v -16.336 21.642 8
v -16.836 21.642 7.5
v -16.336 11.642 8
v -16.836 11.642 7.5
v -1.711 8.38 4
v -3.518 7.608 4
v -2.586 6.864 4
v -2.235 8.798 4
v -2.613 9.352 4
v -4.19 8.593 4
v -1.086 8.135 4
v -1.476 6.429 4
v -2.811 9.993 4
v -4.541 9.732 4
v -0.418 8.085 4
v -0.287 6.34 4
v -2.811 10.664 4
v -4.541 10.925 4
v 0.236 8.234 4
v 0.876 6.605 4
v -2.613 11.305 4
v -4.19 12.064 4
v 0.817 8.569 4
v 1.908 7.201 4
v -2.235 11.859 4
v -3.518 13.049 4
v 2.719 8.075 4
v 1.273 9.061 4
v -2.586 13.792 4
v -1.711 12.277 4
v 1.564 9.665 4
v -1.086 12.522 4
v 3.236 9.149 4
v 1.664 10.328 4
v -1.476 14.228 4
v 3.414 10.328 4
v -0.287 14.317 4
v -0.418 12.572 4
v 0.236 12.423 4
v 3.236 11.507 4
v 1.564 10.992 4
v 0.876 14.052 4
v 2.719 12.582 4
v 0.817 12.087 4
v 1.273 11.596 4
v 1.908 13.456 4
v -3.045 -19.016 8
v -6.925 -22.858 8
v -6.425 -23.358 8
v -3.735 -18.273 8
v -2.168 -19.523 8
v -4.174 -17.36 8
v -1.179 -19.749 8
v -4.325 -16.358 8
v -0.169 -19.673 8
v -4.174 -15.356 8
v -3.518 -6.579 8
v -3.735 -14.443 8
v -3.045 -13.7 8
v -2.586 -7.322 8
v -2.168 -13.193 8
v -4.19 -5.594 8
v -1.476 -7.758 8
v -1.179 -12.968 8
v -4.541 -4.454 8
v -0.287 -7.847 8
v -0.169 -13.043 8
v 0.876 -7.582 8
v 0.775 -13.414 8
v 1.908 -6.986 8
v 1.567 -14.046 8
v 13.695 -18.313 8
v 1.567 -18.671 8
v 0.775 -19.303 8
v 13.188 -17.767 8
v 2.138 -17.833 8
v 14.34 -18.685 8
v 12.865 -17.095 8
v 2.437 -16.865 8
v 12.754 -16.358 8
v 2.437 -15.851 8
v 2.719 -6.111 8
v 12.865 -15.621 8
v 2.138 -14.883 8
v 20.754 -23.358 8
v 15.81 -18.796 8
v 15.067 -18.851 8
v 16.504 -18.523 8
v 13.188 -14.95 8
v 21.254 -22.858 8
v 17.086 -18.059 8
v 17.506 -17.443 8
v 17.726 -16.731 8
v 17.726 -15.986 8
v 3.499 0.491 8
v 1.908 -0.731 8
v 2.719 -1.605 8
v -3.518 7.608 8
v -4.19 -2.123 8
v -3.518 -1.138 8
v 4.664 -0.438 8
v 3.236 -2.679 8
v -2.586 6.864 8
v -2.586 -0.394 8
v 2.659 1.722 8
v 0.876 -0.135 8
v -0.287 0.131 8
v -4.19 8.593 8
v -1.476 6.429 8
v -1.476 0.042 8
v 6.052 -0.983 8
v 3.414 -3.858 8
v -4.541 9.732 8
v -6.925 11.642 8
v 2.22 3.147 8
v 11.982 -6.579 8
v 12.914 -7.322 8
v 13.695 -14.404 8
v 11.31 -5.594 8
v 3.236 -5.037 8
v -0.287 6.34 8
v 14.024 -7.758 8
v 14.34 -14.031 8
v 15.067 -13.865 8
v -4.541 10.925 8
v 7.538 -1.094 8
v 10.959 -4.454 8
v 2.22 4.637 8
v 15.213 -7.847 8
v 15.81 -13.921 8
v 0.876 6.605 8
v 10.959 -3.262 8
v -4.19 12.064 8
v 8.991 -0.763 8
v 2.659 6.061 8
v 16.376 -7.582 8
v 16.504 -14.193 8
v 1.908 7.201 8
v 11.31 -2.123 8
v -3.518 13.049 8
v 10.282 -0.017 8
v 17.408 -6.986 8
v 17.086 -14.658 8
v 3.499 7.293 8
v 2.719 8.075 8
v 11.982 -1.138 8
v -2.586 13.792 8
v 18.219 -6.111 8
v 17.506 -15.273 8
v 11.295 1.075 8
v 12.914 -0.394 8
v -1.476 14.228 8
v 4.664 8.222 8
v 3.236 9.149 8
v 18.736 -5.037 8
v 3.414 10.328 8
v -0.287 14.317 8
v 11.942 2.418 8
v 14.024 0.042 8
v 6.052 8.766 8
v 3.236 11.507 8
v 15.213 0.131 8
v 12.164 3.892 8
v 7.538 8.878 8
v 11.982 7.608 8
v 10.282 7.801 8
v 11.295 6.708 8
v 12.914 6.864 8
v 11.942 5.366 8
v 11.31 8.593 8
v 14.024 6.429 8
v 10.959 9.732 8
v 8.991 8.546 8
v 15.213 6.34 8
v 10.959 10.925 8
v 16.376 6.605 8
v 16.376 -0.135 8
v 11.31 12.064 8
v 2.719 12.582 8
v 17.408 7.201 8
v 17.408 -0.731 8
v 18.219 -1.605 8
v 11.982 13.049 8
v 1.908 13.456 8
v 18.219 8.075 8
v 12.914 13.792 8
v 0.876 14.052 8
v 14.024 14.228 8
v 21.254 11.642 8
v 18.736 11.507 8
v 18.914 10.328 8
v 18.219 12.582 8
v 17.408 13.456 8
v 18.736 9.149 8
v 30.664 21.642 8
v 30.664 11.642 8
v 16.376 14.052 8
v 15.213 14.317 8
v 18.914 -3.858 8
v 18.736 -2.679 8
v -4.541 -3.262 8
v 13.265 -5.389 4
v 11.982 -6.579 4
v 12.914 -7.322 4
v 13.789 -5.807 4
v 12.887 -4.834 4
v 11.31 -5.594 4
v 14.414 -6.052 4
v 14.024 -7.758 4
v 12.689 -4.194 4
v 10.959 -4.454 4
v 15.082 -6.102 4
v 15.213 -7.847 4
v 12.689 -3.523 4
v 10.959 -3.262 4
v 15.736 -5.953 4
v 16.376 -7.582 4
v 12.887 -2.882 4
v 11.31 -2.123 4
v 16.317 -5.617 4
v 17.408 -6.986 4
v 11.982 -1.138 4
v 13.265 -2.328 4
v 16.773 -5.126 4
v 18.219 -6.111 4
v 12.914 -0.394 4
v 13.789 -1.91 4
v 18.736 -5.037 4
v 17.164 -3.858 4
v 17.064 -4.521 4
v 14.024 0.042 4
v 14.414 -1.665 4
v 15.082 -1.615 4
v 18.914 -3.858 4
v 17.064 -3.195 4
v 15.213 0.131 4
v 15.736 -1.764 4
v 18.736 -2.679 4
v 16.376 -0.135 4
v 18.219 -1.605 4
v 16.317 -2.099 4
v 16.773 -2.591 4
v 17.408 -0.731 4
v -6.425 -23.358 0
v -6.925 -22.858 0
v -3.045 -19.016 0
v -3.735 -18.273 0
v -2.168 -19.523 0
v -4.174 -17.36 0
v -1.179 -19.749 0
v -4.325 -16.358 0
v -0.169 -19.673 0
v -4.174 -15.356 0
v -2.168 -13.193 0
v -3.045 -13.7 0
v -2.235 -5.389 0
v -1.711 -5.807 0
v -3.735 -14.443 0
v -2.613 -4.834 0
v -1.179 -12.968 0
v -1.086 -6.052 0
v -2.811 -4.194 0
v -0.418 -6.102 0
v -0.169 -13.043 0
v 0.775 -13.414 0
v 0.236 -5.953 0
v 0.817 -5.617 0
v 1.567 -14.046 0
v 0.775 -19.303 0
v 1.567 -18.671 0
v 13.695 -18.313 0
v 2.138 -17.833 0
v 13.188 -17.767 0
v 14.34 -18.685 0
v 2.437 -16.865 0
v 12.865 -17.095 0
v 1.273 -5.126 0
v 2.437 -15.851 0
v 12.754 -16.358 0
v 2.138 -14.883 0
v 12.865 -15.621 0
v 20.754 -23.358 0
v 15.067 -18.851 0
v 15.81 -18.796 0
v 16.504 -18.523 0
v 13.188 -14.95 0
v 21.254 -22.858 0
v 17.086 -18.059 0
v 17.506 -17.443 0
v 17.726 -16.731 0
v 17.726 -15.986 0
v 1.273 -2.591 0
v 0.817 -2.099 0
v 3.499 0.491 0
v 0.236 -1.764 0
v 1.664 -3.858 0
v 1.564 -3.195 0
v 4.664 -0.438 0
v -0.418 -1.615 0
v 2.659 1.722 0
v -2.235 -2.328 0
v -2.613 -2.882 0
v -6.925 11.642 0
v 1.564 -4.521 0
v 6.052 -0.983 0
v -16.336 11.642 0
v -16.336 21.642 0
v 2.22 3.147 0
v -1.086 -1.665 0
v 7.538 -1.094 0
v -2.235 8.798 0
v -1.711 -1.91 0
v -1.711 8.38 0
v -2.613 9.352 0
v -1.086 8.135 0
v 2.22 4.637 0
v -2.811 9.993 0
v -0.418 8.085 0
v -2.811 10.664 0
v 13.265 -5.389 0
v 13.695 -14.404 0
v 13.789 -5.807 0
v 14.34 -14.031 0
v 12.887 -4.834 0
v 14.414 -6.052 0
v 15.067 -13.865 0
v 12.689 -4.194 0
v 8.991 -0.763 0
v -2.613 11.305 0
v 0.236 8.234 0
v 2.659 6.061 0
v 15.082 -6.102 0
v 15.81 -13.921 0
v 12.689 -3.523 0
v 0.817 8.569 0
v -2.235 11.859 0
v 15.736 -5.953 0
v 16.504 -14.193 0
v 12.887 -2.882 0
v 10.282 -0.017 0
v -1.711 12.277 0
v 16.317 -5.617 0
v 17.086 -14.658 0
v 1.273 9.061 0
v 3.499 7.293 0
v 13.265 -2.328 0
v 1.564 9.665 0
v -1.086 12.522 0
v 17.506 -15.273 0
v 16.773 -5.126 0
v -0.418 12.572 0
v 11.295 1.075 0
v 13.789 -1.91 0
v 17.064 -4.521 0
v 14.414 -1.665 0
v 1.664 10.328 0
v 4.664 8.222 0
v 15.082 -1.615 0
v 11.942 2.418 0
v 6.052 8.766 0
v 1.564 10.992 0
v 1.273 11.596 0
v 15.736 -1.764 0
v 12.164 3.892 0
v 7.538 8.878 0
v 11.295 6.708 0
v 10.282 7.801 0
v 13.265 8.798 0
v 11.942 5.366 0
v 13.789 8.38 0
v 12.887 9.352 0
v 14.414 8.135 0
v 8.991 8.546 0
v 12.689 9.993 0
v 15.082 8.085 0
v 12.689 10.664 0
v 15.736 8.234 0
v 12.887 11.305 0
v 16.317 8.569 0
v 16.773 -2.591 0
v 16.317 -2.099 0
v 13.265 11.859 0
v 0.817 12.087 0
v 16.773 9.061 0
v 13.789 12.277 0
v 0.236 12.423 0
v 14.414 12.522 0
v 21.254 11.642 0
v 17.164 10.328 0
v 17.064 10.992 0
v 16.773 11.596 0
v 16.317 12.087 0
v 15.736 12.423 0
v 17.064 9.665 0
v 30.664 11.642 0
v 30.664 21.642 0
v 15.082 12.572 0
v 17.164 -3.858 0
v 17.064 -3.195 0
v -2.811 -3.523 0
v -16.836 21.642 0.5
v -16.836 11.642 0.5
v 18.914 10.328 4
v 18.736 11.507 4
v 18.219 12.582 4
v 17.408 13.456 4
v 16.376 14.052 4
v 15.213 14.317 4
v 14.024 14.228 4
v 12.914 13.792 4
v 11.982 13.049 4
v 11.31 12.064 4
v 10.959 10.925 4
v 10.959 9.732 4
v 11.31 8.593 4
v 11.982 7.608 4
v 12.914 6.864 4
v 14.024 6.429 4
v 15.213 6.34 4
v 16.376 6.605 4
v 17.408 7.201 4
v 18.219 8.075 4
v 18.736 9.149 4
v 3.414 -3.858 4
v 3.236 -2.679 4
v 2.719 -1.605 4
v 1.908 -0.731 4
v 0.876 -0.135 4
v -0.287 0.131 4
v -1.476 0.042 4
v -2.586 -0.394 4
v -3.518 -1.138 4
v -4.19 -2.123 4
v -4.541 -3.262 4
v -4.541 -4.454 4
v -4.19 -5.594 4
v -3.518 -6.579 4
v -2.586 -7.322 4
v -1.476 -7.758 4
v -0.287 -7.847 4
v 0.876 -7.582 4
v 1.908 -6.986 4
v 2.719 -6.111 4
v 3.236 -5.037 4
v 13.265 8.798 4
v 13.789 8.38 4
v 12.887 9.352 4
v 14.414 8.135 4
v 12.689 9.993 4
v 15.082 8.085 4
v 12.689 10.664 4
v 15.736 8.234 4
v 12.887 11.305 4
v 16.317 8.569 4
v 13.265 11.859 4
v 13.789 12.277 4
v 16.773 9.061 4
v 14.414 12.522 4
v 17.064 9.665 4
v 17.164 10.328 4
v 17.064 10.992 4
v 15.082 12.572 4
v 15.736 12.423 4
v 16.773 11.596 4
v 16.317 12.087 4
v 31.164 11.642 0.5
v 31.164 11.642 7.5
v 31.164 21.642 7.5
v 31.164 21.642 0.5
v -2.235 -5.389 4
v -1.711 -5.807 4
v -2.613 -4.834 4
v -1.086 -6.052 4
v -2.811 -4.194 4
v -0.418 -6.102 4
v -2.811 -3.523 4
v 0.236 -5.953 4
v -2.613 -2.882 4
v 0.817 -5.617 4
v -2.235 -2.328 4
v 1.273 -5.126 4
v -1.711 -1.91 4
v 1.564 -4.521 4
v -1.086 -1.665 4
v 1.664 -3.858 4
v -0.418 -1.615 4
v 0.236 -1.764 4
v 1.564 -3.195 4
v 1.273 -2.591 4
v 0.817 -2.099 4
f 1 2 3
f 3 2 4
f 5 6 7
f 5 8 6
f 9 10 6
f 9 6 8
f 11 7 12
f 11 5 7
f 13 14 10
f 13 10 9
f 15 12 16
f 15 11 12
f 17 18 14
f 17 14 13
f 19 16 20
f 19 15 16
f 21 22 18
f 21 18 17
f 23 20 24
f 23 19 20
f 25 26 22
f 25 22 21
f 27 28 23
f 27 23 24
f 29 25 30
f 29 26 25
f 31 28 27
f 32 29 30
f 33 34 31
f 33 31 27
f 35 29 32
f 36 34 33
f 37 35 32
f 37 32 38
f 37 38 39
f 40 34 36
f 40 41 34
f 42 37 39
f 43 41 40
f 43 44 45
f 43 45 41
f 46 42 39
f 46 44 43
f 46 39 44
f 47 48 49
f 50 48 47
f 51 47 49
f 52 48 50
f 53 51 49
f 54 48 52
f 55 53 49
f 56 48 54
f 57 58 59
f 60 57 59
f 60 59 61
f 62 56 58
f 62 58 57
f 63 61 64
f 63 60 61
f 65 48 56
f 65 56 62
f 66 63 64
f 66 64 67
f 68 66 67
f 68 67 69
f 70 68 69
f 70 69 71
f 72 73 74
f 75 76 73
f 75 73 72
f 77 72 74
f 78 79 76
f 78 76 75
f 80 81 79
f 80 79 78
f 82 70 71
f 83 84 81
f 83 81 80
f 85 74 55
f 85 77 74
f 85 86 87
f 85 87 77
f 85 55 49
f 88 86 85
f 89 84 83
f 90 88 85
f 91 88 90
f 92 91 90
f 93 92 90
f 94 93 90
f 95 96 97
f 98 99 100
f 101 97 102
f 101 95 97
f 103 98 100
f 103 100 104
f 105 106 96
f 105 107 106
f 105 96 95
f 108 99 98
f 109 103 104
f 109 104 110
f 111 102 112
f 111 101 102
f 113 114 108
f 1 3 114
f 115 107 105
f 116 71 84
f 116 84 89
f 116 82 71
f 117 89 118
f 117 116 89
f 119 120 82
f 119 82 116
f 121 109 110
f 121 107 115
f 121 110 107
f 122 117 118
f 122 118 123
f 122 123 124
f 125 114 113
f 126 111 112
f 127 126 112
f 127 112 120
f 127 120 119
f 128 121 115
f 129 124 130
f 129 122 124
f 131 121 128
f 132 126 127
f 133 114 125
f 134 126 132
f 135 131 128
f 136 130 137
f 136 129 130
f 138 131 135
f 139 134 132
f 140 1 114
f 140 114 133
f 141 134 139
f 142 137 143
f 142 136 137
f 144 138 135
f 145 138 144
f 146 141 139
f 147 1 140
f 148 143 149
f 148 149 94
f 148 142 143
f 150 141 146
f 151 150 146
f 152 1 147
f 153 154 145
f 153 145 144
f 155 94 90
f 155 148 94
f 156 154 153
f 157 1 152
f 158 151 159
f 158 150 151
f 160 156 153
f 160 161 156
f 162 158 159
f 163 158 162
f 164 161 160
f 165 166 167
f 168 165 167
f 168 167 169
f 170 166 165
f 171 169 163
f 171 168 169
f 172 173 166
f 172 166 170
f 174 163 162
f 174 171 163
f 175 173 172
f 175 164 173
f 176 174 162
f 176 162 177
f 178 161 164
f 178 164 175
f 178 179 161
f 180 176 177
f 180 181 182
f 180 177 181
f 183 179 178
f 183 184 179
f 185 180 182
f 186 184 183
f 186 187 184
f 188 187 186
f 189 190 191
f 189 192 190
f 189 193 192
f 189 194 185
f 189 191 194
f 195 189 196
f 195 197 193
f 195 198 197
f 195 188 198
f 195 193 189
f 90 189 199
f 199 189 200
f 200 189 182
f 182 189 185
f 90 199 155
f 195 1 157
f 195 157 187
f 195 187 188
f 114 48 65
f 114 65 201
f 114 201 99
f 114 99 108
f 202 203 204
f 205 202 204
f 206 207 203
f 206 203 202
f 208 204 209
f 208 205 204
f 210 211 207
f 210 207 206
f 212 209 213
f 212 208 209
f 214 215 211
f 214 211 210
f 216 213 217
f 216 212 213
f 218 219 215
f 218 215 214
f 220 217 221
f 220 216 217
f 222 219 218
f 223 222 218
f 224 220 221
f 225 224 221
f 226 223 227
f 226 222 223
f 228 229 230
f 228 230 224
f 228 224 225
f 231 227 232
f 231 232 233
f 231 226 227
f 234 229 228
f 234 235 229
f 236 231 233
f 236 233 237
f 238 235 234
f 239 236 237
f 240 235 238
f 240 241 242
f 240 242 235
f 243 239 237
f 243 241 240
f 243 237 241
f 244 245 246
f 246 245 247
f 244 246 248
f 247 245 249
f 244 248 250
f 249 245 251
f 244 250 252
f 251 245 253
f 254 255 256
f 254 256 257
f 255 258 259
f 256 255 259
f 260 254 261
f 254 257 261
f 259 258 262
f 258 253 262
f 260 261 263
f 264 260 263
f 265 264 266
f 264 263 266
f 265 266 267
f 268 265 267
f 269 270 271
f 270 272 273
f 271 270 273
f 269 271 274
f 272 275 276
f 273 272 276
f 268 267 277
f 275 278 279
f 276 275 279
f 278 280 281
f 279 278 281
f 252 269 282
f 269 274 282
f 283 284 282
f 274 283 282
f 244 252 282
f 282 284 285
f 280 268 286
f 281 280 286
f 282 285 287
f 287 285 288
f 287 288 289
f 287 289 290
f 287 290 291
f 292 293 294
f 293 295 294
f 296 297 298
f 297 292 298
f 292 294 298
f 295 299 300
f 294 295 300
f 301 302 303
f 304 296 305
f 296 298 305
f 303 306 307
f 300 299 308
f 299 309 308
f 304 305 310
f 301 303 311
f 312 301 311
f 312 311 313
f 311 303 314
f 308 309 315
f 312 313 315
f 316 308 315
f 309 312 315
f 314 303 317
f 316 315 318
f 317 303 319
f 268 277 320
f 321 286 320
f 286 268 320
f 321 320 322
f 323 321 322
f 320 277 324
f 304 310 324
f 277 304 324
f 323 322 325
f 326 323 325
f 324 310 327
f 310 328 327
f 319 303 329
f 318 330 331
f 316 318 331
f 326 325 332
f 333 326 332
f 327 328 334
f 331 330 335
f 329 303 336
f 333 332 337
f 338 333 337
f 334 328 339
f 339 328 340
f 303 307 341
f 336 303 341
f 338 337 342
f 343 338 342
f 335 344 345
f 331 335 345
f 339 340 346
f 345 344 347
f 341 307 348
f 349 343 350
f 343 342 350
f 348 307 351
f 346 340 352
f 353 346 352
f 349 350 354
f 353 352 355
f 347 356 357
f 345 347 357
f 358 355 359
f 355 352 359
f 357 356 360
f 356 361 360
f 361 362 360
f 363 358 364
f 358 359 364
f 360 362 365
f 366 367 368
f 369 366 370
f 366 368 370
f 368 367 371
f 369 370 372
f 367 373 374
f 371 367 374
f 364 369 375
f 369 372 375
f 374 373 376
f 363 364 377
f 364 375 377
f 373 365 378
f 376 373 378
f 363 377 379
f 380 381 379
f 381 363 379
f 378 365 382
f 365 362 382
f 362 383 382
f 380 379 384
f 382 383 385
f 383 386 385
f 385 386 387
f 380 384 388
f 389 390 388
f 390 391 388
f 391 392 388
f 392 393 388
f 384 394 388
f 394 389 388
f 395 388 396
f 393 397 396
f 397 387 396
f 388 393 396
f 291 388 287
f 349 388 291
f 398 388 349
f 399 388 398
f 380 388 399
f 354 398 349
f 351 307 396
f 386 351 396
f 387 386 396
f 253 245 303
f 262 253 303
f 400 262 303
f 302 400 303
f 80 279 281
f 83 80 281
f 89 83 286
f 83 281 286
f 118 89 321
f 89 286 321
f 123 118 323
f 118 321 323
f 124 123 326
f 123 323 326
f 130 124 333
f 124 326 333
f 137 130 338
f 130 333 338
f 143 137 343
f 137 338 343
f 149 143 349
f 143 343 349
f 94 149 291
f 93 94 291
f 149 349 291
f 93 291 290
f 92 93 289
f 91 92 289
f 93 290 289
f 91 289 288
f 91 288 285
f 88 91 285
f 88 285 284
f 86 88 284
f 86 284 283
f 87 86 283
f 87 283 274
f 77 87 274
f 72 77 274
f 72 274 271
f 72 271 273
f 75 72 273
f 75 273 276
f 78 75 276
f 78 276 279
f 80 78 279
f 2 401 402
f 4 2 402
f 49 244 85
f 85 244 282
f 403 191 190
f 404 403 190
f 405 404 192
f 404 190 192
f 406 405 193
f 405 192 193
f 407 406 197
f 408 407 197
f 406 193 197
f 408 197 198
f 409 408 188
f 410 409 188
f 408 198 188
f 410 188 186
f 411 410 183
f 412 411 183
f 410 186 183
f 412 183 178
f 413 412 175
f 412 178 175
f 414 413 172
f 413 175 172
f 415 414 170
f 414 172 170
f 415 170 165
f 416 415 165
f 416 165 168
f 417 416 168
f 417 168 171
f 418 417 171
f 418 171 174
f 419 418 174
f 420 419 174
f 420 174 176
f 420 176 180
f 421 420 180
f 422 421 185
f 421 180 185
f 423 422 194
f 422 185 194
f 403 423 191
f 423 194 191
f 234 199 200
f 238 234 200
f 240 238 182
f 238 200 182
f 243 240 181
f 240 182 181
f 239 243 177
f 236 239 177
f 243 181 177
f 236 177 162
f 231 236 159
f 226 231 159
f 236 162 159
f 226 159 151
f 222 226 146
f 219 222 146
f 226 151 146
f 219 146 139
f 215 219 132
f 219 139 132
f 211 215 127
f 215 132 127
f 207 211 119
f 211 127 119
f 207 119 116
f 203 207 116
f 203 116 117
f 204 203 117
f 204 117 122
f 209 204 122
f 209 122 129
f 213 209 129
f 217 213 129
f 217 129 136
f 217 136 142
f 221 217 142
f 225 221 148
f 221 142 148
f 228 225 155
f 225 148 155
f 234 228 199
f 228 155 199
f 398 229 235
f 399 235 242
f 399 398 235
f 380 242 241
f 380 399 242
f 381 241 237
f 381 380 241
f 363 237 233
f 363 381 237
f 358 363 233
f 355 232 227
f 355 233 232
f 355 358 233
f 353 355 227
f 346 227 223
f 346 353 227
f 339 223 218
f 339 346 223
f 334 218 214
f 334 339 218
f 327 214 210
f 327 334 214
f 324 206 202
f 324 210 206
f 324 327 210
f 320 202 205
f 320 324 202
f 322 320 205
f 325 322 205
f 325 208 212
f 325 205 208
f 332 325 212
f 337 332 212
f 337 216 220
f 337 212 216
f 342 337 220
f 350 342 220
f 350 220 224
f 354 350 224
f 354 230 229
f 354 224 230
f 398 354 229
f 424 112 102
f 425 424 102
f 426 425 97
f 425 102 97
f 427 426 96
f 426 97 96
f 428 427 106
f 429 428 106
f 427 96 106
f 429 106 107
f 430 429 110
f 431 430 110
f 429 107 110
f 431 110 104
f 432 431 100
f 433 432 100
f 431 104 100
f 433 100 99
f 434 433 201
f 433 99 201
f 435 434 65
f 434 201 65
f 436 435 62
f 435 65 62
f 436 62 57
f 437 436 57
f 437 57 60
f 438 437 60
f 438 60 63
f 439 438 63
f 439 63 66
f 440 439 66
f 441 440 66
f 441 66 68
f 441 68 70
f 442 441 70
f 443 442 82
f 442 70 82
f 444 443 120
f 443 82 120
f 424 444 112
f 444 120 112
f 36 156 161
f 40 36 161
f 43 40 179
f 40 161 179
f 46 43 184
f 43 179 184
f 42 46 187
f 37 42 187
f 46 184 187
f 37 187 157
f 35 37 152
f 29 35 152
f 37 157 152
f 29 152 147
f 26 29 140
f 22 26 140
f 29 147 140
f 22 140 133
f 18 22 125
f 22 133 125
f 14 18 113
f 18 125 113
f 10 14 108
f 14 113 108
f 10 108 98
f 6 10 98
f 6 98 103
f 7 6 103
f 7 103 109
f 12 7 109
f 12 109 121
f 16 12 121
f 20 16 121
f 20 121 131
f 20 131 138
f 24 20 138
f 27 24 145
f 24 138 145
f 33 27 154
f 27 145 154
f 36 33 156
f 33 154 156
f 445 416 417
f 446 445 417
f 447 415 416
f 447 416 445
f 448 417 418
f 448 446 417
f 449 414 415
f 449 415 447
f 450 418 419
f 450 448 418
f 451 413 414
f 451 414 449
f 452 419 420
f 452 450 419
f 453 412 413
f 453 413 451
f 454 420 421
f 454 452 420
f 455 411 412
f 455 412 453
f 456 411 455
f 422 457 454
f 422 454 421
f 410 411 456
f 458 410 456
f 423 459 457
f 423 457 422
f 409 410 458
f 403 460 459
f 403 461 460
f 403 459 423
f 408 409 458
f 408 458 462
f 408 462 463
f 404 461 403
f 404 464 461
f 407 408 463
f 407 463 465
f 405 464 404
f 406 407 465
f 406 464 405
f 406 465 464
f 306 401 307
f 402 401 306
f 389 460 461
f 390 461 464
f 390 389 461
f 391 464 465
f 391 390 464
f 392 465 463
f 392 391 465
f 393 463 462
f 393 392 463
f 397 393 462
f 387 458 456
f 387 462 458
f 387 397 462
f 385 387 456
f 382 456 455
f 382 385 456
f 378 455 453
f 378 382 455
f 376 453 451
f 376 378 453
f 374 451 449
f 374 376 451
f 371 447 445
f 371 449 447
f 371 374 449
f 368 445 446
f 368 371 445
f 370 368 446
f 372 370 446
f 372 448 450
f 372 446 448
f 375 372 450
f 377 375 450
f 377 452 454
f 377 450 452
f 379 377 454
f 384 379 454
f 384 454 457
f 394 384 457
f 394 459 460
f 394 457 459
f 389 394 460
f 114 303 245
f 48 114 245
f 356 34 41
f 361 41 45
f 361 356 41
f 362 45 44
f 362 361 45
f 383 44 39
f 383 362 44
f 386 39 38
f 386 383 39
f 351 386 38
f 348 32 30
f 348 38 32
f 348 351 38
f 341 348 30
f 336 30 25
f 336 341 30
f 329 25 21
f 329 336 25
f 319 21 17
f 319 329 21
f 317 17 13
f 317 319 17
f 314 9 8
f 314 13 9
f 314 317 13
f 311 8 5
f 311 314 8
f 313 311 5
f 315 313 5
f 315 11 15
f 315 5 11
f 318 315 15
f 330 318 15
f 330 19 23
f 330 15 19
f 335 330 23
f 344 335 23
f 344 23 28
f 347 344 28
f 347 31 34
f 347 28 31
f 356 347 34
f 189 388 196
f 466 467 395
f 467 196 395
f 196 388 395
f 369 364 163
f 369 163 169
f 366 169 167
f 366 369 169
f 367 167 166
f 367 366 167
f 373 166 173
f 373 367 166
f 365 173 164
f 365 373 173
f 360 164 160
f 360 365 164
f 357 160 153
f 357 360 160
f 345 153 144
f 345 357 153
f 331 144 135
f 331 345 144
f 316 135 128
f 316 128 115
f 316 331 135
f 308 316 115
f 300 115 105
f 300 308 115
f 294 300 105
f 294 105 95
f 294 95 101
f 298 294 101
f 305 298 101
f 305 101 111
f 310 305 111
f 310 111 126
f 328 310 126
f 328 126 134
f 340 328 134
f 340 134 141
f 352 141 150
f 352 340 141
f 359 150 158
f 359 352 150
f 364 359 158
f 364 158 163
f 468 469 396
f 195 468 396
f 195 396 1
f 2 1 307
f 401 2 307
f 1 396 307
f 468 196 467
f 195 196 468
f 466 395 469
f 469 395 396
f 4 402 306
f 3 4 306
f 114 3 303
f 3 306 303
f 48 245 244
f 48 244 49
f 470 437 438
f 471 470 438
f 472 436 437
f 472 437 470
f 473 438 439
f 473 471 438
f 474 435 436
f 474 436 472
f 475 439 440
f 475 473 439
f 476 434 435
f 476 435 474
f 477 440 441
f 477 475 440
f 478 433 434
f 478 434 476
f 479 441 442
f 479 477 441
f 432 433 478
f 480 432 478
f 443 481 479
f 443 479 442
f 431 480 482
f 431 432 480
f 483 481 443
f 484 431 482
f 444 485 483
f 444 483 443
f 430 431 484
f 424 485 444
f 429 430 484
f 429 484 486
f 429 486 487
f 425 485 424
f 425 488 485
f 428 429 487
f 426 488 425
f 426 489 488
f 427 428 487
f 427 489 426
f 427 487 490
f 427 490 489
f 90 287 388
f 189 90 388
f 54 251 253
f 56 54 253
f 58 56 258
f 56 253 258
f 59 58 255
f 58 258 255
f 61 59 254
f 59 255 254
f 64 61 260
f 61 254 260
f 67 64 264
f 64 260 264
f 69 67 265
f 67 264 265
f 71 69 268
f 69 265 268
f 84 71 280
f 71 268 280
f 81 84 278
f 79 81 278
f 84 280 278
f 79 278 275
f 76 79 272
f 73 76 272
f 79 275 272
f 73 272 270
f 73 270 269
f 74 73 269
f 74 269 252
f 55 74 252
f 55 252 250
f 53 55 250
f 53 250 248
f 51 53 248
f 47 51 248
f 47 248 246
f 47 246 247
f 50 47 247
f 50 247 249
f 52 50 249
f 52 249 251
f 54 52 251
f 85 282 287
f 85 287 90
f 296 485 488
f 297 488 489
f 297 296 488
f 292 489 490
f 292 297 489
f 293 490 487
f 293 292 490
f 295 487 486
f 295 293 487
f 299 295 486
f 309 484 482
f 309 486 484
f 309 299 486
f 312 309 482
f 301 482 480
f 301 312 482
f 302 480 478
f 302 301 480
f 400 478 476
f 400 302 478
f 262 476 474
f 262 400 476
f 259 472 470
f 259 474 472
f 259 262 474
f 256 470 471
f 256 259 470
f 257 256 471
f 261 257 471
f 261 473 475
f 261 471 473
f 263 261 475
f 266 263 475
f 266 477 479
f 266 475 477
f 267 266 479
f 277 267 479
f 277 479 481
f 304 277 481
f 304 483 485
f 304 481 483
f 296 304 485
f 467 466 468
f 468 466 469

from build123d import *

# Parameters (mm, degrees)
SKETCH1_R             = 5
SKETCH1_R_2           = 2.25
BOSS_EXTRUDE1_DEPTH   = 8
SKETCH2_R             = 4
CUT_EXTRUDE1_DEPTH    = 4
M6_TAPPED_HOLE1_D     = 5
M6_TAPPED_HOLE1_DEPTH = 15
M6_TAPPED_HOLE1_TIP   = 1.502151548
M8_TAPPED_HOLE1_D     = 6.8
M8_TAPPED_HOLE1_DEPTH = 19.75
M8_TAPPED_HOLE1_TIP   = 2.042926105
CHAMFER1_SIZE         = 0.5
CHAMFER2_SIZE         = 0.5


with BuildPart() as part:
    # Sketch1 → Boss-Extrude1 (new body)
    with BuildSketch(Plane.XY):
        Polygon((21.253731343, 11.641791045), (31.164179104, 11.641791045), (31.164179104, 21.641791045), (-16.835820896, 21.641791045), (-16.835820896, 11.641791045), (-6.925373134, 11.641791045), (-6.925373134, -23.358208955), (21.253731343, -23.358208955), align=None)
        with Locations((7.164179104, 3.891791045)):
            Circle(SKETCH1_R, mode=Mode.SUBTRACT)
        with Locations((-0.585820896, -3.858208955)):
            Circle(SKETCH1_R_2, mode=Mode.SUBTRACT)
        with Locations((14.914179104, -3.858208955)):
            Circle(SKETCH1_R_2, mode=Mode.SUBTRACT)
        with Locations((14.914179104, 10.328358209)):
            Circle(SKETCH1_R_2, mode=Mode.SUBTRACT)
        with Locations((-0.585820896, 10.328358209)):
            Circle(SKETCH1_R_2, mode=Mode.SUBTRACT)
    extrude(amount=BOSS_EXTRUDE1_DEPTH)

    # Sketch2 → Cut-Extrude1 (cut)
    with BuildSketch(Plane.XY.offset(8)):
        with Locations((-0.585820896, 10.328358209)):
            Circle(SKETCH2_R)
        with Locations((14.914179104, 10.328358209)):
            Circle(SKETCH2_R)
        with Locations((14.914179104, -3.858208955)):
            Circle(SKETCH2_R)
        with Locations((-0.585820896, -3.858208955)):
            Circle(SKETCH2_R)
    extrude(amount=-CUT_EXTRUDE1_DEPTH, mode=Mode.SUBTRACT)

    # M6 Tapped Hole1
    with Locations(Plane.XY.offset(8)):
        with Locations((15.253731343, -16.358208955)):
            Hole(M6_TAPPED_HOLE1_D / 2, depth=M6_TAPPED_HOLE1_DEPTH)
            with Locations((0, 0, -(M6_TAPPED_HOLE1_DEPTH + M6_TAPPED_HOLE1_TIP / 2))):  # 118° drill point
                Cone(0, M6_TAPPED_HOLE1_D / 2, M6_TAPPED_HOLE1_TIP, mode=Mode.SUBTRACT)

    # M8 Tapped Hole1
    with Locations(Plane.XY.offset(8)):
        with Locations((-0.925373134, -16.358208955)):
            Hole(M8_TAPPED_HOLE1_D / 2, depth=M8_TAPPED_HOLE1_DEPTH)
            with Locations((0, 0, -(M8_TAPPED_HOLE1_DEPTH + M8_TAPPED_HOLE1_TIP / 2))):  # 118° drill point
                Cone(0, M8_TAPPED_HOLE1_D / 2, M8_TAPPED_HOLE1_TIP, mode=Mode.SUBTRACT)

    # Chamfer1
    chamfer1_edges = [part.edges().sort_by_distance(p)[0] for p in [
        (-16.835820896, 16.641791045, 0),
        (31.164179104, 16.641791045, 8),
        (-16.835820896, 16.641791045, 8),
        (31.164179104, 16.641791045, 0),
    ]]
    chamfer(chamfer1_edges, length=CHAMFER1_SIZE)

    # Chamfer2
    chamfer2_edges = [part.edges().sort_by_distance(p)[0] for p in [
        (21.253731343, -23.358208955, 4),
        (-6.925373134, -23.358208955, 4),
    ]]
    chamfer(chamfer2_edges, length=CHAMFER2_SIZE)


solid = part.part
